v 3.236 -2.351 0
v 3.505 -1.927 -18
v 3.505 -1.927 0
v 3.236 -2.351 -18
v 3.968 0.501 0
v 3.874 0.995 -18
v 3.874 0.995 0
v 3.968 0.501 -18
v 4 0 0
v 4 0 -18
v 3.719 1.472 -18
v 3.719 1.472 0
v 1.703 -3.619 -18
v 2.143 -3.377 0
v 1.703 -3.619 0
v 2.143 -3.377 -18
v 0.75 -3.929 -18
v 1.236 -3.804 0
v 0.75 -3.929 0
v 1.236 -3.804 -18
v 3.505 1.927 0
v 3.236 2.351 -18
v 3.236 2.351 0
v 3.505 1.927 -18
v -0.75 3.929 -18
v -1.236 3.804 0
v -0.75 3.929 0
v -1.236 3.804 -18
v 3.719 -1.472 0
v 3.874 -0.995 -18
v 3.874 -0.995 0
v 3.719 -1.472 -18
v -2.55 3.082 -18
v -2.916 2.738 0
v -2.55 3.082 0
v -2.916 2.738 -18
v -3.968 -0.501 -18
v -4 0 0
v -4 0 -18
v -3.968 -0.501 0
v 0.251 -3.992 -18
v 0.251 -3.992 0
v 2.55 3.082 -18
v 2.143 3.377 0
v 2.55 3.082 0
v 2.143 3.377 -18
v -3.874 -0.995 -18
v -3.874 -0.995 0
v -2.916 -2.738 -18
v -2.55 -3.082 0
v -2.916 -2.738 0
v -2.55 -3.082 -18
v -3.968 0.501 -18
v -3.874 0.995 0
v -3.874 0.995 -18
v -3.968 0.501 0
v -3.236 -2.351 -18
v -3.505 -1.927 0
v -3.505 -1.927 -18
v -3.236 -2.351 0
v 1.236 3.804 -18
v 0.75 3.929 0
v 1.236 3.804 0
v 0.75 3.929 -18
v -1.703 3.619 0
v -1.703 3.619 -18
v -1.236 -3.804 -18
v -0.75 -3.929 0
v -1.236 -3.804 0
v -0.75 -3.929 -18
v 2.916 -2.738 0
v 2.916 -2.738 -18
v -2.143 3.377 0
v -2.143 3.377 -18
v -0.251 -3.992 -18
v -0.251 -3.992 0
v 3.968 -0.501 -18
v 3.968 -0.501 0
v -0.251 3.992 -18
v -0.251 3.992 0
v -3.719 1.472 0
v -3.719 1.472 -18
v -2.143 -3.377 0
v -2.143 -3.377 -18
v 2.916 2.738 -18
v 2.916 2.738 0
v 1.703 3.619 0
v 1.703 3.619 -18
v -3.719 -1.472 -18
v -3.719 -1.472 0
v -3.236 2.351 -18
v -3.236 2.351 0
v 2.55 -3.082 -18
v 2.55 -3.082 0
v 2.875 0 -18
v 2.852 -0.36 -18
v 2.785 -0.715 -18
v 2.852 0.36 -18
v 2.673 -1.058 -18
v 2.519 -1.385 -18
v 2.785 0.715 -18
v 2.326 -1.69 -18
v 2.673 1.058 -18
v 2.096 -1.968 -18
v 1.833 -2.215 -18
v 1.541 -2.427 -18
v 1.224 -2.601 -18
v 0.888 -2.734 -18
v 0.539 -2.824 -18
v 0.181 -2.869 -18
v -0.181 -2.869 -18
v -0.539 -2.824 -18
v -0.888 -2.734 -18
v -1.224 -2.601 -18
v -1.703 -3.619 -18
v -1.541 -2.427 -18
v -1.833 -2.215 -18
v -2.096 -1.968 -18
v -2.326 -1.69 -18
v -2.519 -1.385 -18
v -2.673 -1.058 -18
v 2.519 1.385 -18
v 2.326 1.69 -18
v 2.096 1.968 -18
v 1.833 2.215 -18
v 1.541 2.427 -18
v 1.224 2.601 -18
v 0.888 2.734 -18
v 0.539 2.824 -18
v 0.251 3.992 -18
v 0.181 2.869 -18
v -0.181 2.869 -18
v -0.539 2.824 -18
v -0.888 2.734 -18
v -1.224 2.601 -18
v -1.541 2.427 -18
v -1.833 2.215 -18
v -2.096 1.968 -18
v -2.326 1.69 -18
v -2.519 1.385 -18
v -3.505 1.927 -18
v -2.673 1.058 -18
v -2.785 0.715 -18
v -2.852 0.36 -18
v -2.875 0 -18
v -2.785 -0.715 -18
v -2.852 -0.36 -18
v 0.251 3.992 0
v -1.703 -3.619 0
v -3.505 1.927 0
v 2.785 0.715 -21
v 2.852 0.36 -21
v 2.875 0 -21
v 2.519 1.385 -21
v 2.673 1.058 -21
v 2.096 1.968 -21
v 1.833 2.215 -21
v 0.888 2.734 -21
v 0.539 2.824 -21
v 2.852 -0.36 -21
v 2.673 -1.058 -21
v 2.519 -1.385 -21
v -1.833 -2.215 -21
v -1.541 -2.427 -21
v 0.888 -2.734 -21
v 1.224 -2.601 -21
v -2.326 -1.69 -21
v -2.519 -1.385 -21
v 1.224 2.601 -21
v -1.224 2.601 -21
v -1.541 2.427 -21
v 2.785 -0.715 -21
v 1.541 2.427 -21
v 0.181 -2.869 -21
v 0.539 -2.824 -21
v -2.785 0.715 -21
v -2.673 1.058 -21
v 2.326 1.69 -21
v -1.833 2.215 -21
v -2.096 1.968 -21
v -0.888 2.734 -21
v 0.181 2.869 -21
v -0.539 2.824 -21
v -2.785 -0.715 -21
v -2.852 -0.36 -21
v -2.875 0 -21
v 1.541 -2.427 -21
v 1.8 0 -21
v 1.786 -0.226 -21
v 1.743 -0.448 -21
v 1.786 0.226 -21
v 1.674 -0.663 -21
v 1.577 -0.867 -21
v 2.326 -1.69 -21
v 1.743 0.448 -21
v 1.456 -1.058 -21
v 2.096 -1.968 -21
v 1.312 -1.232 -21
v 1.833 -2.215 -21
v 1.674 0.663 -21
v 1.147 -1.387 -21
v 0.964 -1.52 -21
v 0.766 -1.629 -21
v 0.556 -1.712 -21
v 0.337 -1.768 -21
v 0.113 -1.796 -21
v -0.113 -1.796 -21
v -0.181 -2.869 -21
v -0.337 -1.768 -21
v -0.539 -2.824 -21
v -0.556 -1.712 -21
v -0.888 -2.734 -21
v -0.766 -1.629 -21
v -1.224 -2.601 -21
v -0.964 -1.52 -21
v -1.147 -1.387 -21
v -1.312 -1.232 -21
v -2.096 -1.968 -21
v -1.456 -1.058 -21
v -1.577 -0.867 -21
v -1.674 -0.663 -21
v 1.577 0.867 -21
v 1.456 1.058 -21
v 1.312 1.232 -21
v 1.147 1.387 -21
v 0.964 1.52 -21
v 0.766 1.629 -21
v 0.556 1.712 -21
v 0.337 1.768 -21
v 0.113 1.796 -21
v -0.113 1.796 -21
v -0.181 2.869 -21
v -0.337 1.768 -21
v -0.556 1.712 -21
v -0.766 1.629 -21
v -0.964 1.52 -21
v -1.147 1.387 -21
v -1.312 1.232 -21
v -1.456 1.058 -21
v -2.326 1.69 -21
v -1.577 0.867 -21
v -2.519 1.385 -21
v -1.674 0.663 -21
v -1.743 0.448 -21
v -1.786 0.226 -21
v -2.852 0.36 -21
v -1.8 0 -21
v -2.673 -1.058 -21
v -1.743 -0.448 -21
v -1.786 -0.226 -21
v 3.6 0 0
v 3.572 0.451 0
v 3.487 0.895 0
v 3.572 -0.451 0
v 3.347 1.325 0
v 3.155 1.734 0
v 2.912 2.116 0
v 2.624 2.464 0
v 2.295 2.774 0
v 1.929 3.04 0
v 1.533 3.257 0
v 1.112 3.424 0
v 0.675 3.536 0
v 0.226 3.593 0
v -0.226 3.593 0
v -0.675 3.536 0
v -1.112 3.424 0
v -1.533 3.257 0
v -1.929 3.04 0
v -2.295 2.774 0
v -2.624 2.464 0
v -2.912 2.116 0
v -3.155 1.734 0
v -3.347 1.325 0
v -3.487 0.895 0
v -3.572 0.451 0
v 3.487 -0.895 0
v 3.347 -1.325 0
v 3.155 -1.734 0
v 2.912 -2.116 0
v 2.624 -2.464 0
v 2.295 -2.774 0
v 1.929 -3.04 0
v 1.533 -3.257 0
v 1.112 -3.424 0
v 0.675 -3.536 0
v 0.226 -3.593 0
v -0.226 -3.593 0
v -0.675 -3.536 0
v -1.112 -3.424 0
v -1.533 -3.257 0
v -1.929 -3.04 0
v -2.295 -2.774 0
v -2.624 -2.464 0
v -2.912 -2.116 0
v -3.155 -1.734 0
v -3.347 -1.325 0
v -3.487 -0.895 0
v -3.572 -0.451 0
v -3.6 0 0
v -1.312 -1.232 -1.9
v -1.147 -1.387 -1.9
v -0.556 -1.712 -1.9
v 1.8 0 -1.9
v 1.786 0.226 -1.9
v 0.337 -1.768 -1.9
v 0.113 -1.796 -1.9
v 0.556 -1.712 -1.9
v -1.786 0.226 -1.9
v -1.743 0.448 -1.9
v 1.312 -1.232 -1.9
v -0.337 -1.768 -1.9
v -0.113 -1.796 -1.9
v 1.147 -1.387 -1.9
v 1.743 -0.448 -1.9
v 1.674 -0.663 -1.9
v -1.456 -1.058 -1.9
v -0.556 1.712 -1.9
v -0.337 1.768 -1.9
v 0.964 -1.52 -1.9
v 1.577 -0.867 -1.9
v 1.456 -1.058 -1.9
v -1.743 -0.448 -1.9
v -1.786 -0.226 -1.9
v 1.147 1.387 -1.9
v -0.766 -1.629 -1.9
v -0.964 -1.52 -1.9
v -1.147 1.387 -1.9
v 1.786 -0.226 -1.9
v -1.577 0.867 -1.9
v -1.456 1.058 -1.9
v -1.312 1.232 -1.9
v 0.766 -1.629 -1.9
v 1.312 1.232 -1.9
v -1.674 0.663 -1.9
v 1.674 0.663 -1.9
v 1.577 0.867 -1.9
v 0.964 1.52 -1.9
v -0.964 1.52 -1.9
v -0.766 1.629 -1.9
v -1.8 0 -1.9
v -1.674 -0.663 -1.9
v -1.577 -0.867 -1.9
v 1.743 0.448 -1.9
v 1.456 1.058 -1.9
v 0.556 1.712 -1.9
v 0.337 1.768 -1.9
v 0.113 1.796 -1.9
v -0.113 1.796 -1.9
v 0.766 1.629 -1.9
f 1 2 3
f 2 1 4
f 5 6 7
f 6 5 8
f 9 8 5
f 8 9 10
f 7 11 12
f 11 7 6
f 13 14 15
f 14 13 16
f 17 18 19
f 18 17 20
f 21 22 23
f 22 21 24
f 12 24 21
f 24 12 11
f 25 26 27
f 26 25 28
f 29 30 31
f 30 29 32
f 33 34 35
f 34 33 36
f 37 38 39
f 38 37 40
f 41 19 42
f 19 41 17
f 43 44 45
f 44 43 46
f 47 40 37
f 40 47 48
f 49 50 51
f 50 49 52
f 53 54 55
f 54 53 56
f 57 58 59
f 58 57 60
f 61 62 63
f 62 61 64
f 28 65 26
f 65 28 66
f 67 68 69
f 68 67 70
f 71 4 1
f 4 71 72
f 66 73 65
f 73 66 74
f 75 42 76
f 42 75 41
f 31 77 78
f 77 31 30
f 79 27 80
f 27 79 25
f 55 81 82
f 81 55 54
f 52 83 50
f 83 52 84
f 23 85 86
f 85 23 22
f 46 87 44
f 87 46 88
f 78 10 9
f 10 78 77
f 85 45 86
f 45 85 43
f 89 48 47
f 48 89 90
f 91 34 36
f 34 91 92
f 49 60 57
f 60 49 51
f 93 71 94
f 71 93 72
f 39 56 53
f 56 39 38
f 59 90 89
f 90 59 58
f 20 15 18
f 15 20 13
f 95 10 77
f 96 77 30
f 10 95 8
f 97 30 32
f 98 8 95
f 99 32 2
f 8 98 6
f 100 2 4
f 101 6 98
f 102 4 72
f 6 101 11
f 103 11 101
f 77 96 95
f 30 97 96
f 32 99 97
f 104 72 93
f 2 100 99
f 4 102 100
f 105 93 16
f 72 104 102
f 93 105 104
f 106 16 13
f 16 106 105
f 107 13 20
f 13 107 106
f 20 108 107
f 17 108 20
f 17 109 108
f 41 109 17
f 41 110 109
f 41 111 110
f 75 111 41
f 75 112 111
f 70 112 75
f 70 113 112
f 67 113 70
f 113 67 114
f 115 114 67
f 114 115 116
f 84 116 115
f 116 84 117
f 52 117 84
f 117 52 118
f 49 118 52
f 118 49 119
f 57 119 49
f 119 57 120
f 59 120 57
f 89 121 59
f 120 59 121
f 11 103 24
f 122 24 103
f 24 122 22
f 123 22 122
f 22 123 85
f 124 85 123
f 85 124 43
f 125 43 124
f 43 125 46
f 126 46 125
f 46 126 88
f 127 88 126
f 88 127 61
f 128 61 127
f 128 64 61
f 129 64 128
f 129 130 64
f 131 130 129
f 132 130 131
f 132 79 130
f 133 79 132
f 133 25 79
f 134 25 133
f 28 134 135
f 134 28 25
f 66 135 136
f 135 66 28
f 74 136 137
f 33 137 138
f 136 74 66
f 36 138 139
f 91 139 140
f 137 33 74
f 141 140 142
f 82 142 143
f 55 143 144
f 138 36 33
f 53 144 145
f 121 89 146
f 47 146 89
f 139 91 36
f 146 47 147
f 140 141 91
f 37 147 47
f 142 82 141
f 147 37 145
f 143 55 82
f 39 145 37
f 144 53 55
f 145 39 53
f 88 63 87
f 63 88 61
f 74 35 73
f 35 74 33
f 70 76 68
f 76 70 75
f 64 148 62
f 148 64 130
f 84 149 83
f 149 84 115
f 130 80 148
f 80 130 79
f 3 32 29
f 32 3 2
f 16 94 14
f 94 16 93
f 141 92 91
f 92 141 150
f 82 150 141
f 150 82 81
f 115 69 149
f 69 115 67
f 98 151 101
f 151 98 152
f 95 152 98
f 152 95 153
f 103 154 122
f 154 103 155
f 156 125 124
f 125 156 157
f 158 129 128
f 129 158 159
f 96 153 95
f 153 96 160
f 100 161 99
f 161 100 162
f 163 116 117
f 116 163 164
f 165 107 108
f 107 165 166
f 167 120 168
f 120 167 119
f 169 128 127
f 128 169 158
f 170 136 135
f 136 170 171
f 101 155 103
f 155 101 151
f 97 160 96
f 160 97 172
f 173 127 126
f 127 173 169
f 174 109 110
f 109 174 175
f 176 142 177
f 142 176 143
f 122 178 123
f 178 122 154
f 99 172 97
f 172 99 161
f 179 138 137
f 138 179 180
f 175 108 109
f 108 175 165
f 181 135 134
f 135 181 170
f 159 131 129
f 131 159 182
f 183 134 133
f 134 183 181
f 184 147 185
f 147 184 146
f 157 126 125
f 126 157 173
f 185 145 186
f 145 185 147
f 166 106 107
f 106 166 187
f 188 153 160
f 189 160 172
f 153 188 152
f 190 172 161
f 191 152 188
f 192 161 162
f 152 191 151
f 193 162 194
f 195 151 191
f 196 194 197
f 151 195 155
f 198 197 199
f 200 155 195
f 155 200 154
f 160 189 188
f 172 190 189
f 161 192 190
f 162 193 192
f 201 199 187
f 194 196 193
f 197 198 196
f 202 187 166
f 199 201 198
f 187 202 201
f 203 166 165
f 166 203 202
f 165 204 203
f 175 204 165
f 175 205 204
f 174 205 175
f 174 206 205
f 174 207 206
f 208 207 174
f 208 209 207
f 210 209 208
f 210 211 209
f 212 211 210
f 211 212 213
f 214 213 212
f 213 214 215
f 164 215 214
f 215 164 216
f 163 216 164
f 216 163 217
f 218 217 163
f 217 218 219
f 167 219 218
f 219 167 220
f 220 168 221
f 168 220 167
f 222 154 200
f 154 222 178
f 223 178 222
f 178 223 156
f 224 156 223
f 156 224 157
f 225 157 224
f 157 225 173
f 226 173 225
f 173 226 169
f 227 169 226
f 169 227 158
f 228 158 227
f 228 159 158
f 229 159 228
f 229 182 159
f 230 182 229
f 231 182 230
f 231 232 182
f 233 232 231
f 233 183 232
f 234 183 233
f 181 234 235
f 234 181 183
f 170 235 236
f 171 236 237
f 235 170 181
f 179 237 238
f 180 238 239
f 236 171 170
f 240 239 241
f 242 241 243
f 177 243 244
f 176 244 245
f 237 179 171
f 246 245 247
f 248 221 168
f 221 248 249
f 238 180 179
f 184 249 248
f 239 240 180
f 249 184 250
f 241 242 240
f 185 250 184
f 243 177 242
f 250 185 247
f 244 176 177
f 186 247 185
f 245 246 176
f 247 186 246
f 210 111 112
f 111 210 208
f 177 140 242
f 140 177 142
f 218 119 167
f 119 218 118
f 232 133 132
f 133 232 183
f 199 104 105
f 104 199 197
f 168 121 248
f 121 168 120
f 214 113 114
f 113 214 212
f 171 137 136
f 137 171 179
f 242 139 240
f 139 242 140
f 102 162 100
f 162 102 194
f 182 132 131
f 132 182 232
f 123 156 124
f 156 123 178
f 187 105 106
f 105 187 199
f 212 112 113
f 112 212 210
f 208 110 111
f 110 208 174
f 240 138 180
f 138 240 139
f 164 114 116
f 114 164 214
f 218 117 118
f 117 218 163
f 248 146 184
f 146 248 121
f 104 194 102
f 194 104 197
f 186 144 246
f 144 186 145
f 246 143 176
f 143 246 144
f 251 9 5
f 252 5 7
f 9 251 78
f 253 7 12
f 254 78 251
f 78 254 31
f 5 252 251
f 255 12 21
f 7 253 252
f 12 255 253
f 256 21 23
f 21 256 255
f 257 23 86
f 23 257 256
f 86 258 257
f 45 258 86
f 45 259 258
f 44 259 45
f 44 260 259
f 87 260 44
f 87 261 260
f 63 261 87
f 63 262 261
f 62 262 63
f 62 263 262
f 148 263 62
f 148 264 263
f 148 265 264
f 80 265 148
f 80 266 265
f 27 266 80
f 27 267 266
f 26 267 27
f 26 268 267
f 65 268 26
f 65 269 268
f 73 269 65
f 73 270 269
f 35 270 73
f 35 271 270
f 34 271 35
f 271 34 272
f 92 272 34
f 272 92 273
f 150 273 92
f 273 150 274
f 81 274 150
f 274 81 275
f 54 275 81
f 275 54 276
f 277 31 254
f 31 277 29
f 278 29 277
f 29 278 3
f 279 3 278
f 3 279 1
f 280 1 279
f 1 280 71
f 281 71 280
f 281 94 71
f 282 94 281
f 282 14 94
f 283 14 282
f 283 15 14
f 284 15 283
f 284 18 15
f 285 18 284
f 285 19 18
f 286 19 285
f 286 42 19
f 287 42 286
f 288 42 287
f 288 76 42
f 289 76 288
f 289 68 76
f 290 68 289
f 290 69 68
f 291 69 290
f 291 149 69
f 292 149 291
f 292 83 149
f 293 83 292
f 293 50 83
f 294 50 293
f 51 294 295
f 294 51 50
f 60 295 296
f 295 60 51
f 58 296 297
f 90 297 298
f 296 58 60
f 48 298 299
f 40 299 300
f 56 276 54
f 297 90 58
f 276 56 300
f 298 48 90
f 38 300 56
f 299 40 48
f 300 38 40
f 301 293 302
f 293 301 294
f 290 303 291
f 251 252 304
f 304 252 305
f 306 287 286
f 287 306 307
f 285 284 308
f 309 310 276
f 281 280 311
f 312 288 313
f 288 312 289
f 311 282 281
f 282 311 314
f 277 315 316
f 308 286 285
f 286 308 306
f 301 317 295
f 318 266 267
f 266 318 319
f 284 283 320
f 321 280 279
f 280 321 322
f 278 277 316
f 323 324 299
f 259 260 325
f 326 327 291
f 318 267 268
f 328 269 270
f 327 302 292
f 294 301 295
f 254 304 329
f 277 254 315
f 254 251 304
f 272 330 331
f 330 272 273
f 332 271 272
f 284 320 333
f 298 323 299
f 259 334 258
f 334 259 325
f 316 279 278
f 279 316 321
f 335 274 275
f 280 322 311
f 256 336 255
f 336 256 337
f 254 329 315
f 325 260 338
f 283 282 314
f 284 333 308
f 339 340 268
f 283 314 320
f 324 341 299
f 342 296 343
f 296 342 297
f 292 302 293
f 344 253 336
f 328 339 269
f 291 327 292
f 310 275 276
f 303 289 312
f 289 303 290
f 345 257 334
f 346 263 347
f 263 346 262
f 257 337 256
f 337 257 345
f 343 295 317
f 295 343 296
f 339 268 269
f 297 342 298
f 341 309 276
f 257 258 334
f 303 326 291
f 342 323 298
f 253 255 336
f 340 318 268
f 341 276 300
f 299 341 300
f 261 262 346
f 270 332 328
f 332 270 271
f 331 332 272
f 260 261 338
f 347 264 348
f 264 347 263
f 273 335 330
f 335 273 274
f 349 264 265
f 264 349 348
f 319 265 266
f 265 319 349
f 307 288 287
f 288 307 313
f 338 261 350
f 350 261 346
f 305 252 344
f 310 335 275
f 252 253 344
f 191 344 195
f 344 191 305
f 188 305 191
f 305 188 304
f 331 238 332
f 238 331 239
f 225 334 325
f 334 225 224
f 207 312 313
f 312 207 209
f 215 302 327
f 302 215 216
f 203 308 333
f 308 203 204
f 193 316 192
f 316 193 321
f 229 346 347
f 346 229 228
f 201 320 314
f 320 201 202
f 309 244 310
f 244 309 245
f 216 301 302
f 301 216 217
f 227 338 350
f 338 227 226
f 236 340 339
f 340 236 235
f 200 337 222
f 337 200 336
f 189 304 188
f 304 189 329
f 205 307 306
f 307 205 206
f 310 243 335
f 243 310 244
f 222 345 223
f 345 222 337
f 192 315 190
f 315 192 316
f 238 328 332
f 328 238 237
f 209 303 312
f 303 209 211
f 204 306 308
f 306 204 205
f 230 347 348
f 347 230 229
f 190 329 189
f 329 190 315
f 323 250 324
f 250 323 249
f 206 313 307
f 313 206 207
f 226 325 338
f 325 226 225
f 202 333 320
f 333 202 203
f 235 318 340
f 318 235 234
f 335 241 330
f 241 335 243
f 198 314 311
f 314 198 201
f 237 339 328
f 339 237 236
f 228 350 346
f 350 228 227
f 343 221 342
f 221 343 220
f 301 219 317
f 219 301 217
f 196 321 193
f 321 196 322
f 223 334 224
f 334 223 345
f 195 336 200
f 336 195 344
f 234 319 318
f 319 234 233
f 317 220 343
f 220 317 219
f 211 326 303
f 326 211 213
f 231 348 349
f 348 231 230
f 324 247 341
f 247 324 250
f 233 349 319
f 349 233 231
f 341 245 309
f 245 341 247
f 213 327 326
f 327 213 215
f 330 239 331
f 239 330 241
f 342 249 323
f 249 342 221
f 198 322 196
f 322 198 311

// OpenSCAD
$fn = 50;

difference() {
	union() {
		translate(v = [0, 0, -18.0]) {
			cylinder(h = 21, r = 4.0);
		}
		#translate(v = [0, 0, -21.0]) {
			cylinder(h = 21, r = 2.875);
		}
	}
	union() {
		translate(v = [0, 0, 0]) {
			rotate(a = [0, 0, 0]) {
				difference() {
					union() {
						translate(v = [0, 0, -21.0]) {
							cylinder(h = 21, r = 1.5);
						}
						translate(v = [0, 0, -1.9]) {
							cylinder(h = 1.9, r1 = 1.8, r2 = 3.6);
						}
						translate(v = [0, 0, -21.0]) {
							cylinder(h = 21, r = 1.8);
						}
						translate(v = [0, 0, -21.0]) {
							cylinder(h = 21, r = 1.5);
						}
					}
					union();
				}
			}
		}
		#cylinder(h = 3, r = 5.0);
	}
}
